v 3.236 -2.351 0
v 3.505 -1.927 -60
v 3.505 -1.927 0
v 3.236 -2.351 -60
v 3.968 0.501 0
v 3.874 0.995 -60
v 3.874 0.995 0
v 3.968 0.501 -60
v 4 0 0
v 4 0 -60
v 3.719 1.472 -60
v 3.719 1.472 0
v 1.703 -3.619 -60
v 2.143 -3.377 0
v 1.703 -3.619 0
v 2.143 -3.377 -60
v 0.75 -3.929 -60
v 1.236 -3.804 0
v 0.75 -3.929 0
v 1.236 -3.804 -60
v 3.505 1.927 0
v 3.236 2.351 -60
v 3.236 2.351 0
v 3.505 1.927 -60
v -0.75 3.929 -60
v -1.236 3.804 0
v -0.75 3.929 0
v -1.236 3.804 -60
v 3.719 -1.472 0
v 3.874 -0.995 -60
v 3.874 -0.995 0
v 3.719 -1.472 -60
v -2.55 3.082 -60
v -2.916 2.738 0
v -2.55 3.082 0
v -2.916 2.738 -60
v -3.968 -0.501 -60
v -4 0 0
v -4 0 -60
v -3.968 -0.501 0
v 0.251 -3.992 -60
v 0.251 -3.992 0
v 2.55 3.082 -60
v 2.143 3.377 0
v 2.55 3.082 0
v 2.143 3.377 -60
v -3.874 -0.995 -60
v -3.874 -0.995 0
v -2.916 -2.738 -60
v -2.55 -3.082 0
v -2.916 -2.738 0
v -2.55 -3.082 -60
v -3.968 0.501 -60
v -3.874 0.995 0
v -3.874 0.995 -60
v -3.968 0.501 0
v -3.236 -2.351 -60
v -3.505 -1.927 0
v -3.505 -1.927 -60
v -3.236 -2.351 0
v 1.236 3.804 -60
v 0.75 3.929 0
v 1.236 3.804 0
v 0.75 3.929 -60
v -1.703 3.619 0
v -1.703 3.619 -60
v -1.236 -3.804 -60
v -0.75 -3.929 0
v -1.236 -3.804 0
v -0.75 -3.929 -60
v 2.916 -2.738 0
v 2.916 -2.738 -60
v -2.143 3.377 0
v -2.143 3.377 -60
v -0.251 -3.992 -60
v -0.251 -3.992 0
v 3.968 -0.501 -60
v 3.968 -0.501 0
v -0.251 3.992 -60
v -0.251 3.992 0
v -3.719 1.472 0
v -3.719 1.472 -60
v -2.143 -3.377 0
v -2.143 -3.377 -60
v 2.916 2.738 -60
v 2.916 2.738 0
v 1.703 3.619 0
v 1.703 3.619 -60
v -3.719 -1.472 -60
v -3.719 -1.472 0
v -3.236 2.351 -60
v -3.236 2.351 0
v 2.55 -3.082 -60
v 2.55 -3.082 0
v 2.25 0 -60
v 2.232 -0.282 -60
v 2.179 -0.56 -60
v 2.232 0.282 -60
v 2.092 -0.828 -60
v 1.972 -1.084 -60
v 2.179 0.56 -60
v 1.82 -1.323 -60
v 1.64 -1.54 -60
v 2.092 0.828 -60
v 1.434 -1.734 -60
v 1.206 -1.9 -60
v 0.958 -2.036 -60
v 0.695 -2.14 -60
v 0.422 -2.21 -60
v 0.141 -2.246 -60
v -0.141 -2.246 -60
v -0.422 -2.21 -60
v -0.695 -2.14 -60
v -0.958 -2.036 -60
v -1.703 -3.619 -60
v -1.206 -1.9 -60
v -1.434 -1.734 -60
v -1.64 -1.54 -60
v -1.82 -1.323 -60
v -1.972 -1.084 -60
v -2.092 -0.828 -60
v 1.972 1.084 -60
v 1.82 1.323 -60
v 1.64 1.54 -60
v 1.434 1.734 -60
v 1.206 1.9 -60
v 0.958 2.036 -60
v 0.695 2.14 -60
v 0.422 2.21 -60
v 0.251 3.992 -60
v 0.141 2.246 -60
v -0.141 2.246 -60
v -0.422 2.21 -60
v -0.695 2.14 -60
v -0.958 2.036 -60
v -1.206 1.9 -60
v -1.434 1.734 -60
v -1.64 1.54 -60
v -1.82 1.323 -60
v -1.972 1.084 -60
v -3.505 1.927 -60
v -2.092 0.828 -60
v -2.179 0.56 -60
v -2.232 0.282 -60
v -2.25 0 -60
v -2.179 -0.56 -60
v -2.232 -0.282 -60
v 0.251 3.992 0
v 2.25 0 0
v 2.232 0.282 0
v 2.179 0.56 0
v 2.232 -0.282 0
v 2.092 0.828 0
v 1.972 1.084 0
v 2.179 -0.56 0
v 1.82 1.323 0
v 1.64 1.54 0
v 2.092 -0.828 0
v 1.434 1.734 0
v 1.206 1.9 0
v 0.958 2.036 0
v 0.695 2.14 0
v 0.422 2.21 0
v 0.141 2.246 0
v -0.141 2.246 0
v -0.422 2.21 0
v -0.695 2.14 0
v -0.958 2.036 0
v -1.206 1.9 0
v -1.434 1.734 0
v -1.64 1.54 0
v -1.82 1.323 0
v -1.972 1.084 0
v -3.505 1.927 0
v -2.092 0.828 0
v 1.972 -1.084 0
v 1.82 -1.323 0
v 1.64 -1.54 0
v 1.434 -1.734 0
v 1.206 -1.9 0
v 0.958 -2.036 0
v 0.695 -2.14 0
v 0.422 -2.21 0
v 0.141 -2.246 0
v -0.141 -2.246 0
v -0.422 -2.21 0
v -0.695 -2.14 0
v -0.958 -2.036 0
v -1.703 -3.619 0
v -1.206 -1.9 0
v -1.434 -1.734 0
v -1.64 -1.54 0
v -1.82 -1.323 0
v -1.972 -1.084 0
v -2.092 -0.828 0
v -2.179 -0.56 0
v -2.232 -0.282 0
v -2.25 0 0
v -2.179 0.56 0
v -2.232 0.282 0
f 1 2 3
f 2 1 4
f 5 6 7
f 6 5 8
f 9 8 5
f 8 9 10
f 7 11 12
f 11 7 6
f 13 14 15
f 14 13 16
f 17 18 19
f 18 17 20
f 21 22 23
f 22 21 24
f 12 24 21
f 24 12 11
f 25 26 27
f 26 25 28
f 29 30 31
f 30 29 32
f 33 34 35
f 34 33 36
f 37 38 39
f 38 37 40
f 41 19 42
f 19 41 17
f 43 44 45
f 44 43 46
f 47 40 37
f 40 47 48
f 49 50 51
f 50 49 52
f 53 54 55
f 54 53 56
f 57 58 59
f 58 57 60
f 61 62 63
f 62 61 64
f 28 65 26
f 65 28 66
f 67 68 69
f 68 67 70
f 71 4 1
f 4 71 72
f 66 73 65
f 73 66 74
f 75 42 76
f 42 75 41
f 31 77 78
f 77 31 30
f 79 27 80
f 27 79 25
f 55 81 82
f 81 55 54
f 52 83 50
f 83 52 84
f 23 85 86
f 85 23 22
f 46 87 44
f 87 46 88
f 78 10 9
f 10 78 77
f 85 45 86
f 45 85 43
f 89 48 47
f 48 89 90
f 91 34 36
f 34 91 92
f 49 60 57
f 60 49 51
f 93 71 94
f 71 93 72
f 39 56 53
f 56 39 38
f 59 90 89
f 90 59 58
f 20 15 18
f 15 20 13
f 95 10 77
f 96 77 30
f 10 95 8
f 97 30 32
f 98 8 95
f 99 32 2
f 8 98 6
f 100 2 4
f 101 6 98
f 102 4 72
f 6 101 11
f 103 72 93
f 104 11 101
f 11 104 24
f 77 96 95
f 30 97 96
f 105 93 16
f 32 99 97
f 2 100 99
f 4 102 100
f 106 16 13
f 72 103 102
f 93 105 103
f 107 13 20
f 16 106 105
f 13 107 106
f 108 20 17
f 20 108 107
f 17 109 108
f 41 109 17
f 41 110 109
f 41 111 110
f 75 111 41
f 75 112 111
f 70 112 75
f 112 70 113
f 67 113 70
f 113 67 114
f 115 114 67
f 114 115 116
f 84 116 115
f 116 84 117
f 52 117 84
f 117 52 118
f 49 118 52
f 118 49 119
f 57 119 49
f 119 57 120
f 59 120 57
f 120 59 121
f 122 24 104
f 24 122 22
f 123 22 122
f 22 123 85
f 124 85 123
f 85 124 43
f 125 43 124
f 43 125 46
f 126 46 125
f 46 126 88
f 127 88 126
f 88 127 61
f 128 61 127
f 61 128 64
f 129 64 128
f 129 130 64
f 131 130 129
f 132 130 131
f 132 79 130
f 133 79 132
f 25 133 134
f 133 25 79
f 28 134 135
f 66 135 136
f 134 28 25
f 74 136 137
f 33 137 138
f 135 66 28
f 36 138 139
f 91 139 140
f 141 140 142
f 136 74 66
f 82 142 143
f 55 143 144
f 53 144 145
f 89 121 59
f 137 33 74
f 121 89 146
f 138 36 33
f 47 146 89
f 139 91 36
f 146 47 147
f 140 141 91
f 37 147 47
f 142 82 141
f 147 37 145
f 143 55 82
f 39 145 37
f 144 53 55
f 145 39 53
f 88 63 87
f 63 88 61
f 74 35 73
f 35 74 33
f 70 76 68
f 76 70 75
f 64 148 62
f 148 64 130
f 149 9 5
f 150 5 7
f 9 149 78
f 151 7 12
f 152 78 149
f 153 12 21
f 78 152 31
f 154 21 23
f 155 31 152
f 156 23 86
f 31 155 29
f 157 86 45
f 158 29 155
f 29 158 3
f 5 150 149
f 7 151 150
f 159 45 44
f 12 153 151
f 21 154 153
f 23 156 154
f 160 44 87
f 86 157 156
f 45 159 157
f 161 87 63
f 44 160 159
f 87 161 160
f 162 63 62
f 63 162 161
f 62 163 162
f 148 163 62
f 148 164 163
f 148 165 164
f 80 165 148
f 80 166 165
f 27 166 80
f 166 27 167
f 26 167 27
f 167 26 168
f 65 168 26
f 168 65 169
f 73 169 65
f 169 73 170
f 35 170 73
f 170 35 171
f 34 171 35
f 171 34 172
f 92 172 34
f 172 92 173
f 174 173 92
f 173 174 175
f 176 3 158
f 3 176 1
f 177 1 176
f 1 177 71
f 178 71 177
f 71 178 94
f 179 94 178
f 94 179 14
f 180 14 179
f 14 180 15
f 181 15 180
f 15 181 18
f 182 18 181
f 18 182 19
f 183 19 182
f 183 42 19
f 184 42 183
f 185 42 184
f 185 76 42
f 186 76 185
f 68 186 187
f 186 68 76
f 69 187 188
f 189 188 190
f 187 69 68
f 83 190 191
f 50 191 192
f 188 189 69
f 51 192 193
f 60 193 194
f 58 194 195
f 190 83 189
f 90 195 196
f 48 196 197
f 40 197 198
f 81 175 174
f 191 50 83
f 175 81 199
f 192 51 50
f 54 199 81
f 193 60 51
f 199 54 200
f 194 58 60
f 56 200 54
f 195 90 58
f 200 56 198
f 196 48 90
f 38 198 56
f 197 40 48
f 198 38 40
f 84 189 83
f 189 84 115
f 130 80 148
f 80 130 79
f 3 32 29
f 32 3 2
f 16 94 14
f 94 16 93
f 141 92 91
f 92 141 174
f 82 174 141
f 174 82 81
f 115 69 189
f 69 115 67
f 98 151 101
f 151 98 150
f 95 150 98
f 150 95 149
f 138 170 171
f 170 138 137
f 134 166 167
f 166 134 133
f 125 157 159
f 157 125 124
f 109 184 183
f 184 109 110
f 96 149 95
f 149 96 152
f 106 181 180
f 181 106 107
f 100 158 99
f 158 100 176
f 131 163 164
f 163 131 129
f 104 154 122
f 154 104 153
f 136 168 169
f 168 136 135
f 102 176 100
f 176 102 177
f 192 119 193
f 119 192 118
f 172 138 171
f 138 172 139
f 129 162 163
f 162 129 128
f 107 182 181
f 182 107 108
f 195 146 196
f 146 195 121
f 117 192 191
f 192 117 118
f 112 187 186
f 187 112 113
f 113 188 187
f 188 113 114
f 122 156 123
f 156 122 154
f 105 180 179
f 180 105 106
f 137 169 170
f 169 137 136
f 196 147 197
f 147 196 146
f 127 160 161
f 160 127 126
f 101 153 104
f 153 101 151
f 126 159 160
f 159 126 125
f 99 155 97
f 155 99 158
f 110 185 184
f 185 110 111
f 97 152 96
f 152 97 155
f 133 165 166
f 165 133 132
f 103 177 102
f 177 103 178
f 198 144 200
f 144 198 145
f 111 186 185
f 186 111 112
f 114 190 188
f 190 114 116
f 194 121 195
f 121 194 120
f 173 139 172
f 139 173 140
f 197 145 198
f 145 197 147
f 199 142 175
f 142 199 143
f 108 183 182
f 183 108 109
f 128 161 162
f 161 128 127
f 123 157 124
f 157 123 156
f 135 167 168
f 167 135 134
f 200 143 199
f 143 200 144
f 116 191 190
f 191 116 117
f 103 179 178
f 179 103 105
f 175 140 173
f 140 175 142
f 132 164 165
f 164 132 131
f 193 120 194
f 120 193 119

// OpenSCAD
$fn = 50;


difference() {
	union() {
		translate(v = [0, 0, -60.0000000000]) {
			cylinder(h = 60, r = 4.0000000000);
		}
		cylinder(h = 0, r = 7.0000000000);
	}
	union() {
		#translate(v = [0, 0, -60]) {
			cylinder(h = 60, r = 2.2500000000);
		}
	}
}
